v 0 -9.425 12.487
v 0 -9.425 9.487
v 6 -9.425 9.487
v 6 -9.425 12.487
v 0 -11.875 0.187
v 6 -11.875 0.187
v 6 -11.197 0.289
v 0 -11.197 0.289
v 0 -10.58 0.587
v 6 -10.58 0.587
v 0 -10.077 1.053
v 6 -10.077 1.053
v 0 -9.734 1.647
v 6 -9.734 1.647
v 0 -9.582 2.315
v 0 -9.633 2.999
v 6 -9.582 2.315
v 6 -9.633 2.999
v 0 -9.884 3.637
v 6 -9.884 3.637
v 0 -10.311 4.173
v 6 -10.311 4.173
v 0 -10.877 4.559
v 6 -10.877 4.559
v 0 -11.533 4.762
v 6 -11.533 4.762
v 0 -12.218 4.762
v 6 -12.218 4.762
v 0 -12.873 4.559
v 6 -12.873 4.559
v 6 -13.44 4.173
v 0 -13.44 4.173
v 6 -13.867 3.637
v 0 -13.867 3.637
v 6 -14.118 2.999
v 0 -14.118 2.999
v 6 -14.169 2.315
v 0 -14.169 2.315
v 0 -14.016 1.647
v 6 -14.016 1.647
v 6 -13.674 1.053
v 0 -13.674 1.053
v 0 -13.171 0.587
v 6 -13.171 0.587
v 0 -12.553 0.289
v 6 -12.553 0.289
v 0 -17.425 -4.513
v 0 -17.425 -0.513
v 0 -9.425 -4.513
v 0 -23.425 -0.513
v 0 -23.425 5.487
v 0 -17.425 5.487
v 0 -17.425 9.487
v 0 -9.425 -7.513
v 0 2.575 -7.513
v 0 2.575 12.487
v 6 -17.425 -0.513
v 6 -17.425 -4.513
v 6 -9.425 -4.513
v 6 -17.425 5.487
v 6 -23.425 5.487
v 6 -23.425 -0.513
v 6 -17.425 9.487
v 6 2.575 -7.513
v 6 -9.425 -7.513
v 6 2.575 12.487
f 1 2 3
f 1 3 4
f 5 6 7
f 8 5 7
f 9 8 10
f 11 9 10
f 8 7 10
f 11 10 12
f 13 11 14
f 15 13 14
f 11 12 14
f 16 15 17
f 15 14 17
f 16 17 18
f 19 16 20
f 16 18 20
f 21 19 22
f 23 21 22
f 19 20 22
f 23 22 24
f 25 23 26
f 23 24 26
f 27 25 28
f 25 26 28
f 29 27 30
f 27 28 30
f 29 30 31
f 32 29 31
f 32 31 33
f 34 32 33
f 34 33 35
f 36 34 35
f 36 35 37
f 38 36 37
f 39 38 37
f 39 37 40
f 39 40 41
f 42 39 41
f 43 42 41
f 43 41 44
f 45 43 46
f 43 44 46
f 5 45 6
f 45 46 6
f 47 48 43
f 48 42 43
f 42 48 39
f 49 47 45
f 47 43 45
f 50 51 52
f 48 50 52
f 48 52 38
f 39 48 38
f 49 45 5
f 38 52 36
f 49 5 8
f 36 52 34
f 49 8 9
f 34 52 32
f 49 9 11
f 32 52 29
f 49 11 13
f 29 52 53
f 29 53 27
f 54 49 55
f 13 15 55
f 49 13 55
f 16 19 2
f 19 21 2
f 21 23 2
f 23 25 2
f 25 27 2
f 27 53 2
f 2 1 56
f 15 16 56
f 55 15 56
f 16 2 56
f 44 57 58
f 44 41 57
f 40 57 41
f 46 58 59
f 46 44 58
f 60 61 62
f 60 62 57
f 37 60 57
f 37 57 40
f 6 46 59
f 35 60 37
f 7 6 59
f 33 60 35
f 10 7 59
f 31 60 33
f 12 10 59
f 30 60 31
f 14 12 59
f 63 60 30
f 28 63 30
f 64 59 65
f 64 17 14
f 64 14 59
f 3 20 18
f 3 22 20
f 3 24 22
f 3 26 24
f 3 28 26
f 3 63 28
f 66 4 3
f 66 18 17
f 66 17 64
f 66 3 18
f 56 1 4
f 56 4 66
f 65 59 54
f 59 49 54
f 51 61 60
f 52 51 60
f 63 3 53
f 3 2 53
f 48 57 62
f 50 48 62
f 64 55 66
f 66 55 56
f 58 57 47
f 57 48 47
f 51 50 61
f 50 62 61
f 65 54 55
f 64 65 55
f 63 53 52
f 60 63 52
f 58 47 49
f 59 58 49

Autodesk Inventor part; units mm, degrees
ref_plane "YZ Plane" through (0, 0, 0) normal (1, 0, 0) x (0, 1, 0)
ref_plane "XZ Plane" through (0, 0, 0) normal (0, 1, 0) x (-1, 0, 0)
ref_plane "XY Plane" through (0, 0, 0) normal (0, 0, 1) x (1, 0, 0)
sketch "Sketch1" plane through (0, 0, 0) normal (1, 0, 0) x (0, 1, 0)
  line L0 (2.5746, 9.4872) -> (-17.4254, 9.4872)
  line L1 (-17.4254, 9.4872) -> (-17.4254, -4.5128)
  line L2 (-17.4254, -4.5128) -> (2.5746, -4.5128)
  line L3 (2.5746, -4.5128) -> (2.5746, 9.4872)
  line L4 (2.5746, -4.5128) -> (-9.4254, -4.5128)
  line L5 (-9.4254, -4.5128) -> (-9.4254, -7.5128)
  line L6 (-9.4254, -7.5128) -> (2.5746, -7.5128)
  line L7 (2.5746, -7.5128) -> (2.5746, -4.5128)
  line L8 (2.5746, 9.4872) -> (-9.4254, 9.4872)
  line L9 (-9.4254, 9.4872) -> (-9.4254, 12.4872)
  line L10 (-9.4254, 12.4872) -> (2.5746, 12.4872)
  line L11 (2.5746, 12.4872) -> (2.5746, 9.4872)
  point P0 (0, 0)
  dimension "d0" = 20
  dimension "d1" = 14
  dimension "d2" = 12
  dimension "d3" = 3
  dimension "d4" = 12
  dimension "d5" = 3
extrude "Extrusion1" add sketch "Sketch1" along normal blind 6
sketch "Sketch2" plane through (6, 0, 0) normal (1, 0, 0) x (0, 0, -1)
  circle A0 centre (-2.4872, -11.8754) radius 2.3
  line L0 (-9.4872, -17.4254) -> (4.5128, -17.4254) projected
  line L1 (-9.4872, -9.4254) -> (-9.4872, -17.4254) projected
  point P0 (0, 0)
  dimension "d8" = 4.6
  dimension "d9" = 5.55
  dimension "d10" = 7
extrude "Extrusion2" cut sketch "Sketch2" against normal blind 6
sketch "Sketch3" plane through (6, 0, 0) normal (1, 0, 0) x (0, 0, -1)
  line L0 (-5.4872, -17.4254) -> (0.5128, -17.4254)
  line L1 (0.5128, -17.4254) -> (0.5128, -23.4254)
  line L2 (0.5128, -23.4254) -> (-5.4872, -23.4254)
  line L3 (-5.4872, -23.4254) -> (-5.4872, -17.4254)
  line L4 (-9.4872, -9.4254) -> (-9.4872, -17.4254) construction
  line L5 (-9.4872, -17.4254) -> (-5.4872, -17.4254) construction
  line L6 (0.5128, -17.4254) -> (4.5128, -17.4254) construction
  line L7 (-9.4872, -17.4254) -> (4.5128, -17.4254) construction
  point P0 (0, 0)
  dimension "d13" = 6
  dimension "d14" = 6
extrude "Extrusion3" add sketch "Sketch3" against normal blind 6
properties part number "apoio do meioesse"
